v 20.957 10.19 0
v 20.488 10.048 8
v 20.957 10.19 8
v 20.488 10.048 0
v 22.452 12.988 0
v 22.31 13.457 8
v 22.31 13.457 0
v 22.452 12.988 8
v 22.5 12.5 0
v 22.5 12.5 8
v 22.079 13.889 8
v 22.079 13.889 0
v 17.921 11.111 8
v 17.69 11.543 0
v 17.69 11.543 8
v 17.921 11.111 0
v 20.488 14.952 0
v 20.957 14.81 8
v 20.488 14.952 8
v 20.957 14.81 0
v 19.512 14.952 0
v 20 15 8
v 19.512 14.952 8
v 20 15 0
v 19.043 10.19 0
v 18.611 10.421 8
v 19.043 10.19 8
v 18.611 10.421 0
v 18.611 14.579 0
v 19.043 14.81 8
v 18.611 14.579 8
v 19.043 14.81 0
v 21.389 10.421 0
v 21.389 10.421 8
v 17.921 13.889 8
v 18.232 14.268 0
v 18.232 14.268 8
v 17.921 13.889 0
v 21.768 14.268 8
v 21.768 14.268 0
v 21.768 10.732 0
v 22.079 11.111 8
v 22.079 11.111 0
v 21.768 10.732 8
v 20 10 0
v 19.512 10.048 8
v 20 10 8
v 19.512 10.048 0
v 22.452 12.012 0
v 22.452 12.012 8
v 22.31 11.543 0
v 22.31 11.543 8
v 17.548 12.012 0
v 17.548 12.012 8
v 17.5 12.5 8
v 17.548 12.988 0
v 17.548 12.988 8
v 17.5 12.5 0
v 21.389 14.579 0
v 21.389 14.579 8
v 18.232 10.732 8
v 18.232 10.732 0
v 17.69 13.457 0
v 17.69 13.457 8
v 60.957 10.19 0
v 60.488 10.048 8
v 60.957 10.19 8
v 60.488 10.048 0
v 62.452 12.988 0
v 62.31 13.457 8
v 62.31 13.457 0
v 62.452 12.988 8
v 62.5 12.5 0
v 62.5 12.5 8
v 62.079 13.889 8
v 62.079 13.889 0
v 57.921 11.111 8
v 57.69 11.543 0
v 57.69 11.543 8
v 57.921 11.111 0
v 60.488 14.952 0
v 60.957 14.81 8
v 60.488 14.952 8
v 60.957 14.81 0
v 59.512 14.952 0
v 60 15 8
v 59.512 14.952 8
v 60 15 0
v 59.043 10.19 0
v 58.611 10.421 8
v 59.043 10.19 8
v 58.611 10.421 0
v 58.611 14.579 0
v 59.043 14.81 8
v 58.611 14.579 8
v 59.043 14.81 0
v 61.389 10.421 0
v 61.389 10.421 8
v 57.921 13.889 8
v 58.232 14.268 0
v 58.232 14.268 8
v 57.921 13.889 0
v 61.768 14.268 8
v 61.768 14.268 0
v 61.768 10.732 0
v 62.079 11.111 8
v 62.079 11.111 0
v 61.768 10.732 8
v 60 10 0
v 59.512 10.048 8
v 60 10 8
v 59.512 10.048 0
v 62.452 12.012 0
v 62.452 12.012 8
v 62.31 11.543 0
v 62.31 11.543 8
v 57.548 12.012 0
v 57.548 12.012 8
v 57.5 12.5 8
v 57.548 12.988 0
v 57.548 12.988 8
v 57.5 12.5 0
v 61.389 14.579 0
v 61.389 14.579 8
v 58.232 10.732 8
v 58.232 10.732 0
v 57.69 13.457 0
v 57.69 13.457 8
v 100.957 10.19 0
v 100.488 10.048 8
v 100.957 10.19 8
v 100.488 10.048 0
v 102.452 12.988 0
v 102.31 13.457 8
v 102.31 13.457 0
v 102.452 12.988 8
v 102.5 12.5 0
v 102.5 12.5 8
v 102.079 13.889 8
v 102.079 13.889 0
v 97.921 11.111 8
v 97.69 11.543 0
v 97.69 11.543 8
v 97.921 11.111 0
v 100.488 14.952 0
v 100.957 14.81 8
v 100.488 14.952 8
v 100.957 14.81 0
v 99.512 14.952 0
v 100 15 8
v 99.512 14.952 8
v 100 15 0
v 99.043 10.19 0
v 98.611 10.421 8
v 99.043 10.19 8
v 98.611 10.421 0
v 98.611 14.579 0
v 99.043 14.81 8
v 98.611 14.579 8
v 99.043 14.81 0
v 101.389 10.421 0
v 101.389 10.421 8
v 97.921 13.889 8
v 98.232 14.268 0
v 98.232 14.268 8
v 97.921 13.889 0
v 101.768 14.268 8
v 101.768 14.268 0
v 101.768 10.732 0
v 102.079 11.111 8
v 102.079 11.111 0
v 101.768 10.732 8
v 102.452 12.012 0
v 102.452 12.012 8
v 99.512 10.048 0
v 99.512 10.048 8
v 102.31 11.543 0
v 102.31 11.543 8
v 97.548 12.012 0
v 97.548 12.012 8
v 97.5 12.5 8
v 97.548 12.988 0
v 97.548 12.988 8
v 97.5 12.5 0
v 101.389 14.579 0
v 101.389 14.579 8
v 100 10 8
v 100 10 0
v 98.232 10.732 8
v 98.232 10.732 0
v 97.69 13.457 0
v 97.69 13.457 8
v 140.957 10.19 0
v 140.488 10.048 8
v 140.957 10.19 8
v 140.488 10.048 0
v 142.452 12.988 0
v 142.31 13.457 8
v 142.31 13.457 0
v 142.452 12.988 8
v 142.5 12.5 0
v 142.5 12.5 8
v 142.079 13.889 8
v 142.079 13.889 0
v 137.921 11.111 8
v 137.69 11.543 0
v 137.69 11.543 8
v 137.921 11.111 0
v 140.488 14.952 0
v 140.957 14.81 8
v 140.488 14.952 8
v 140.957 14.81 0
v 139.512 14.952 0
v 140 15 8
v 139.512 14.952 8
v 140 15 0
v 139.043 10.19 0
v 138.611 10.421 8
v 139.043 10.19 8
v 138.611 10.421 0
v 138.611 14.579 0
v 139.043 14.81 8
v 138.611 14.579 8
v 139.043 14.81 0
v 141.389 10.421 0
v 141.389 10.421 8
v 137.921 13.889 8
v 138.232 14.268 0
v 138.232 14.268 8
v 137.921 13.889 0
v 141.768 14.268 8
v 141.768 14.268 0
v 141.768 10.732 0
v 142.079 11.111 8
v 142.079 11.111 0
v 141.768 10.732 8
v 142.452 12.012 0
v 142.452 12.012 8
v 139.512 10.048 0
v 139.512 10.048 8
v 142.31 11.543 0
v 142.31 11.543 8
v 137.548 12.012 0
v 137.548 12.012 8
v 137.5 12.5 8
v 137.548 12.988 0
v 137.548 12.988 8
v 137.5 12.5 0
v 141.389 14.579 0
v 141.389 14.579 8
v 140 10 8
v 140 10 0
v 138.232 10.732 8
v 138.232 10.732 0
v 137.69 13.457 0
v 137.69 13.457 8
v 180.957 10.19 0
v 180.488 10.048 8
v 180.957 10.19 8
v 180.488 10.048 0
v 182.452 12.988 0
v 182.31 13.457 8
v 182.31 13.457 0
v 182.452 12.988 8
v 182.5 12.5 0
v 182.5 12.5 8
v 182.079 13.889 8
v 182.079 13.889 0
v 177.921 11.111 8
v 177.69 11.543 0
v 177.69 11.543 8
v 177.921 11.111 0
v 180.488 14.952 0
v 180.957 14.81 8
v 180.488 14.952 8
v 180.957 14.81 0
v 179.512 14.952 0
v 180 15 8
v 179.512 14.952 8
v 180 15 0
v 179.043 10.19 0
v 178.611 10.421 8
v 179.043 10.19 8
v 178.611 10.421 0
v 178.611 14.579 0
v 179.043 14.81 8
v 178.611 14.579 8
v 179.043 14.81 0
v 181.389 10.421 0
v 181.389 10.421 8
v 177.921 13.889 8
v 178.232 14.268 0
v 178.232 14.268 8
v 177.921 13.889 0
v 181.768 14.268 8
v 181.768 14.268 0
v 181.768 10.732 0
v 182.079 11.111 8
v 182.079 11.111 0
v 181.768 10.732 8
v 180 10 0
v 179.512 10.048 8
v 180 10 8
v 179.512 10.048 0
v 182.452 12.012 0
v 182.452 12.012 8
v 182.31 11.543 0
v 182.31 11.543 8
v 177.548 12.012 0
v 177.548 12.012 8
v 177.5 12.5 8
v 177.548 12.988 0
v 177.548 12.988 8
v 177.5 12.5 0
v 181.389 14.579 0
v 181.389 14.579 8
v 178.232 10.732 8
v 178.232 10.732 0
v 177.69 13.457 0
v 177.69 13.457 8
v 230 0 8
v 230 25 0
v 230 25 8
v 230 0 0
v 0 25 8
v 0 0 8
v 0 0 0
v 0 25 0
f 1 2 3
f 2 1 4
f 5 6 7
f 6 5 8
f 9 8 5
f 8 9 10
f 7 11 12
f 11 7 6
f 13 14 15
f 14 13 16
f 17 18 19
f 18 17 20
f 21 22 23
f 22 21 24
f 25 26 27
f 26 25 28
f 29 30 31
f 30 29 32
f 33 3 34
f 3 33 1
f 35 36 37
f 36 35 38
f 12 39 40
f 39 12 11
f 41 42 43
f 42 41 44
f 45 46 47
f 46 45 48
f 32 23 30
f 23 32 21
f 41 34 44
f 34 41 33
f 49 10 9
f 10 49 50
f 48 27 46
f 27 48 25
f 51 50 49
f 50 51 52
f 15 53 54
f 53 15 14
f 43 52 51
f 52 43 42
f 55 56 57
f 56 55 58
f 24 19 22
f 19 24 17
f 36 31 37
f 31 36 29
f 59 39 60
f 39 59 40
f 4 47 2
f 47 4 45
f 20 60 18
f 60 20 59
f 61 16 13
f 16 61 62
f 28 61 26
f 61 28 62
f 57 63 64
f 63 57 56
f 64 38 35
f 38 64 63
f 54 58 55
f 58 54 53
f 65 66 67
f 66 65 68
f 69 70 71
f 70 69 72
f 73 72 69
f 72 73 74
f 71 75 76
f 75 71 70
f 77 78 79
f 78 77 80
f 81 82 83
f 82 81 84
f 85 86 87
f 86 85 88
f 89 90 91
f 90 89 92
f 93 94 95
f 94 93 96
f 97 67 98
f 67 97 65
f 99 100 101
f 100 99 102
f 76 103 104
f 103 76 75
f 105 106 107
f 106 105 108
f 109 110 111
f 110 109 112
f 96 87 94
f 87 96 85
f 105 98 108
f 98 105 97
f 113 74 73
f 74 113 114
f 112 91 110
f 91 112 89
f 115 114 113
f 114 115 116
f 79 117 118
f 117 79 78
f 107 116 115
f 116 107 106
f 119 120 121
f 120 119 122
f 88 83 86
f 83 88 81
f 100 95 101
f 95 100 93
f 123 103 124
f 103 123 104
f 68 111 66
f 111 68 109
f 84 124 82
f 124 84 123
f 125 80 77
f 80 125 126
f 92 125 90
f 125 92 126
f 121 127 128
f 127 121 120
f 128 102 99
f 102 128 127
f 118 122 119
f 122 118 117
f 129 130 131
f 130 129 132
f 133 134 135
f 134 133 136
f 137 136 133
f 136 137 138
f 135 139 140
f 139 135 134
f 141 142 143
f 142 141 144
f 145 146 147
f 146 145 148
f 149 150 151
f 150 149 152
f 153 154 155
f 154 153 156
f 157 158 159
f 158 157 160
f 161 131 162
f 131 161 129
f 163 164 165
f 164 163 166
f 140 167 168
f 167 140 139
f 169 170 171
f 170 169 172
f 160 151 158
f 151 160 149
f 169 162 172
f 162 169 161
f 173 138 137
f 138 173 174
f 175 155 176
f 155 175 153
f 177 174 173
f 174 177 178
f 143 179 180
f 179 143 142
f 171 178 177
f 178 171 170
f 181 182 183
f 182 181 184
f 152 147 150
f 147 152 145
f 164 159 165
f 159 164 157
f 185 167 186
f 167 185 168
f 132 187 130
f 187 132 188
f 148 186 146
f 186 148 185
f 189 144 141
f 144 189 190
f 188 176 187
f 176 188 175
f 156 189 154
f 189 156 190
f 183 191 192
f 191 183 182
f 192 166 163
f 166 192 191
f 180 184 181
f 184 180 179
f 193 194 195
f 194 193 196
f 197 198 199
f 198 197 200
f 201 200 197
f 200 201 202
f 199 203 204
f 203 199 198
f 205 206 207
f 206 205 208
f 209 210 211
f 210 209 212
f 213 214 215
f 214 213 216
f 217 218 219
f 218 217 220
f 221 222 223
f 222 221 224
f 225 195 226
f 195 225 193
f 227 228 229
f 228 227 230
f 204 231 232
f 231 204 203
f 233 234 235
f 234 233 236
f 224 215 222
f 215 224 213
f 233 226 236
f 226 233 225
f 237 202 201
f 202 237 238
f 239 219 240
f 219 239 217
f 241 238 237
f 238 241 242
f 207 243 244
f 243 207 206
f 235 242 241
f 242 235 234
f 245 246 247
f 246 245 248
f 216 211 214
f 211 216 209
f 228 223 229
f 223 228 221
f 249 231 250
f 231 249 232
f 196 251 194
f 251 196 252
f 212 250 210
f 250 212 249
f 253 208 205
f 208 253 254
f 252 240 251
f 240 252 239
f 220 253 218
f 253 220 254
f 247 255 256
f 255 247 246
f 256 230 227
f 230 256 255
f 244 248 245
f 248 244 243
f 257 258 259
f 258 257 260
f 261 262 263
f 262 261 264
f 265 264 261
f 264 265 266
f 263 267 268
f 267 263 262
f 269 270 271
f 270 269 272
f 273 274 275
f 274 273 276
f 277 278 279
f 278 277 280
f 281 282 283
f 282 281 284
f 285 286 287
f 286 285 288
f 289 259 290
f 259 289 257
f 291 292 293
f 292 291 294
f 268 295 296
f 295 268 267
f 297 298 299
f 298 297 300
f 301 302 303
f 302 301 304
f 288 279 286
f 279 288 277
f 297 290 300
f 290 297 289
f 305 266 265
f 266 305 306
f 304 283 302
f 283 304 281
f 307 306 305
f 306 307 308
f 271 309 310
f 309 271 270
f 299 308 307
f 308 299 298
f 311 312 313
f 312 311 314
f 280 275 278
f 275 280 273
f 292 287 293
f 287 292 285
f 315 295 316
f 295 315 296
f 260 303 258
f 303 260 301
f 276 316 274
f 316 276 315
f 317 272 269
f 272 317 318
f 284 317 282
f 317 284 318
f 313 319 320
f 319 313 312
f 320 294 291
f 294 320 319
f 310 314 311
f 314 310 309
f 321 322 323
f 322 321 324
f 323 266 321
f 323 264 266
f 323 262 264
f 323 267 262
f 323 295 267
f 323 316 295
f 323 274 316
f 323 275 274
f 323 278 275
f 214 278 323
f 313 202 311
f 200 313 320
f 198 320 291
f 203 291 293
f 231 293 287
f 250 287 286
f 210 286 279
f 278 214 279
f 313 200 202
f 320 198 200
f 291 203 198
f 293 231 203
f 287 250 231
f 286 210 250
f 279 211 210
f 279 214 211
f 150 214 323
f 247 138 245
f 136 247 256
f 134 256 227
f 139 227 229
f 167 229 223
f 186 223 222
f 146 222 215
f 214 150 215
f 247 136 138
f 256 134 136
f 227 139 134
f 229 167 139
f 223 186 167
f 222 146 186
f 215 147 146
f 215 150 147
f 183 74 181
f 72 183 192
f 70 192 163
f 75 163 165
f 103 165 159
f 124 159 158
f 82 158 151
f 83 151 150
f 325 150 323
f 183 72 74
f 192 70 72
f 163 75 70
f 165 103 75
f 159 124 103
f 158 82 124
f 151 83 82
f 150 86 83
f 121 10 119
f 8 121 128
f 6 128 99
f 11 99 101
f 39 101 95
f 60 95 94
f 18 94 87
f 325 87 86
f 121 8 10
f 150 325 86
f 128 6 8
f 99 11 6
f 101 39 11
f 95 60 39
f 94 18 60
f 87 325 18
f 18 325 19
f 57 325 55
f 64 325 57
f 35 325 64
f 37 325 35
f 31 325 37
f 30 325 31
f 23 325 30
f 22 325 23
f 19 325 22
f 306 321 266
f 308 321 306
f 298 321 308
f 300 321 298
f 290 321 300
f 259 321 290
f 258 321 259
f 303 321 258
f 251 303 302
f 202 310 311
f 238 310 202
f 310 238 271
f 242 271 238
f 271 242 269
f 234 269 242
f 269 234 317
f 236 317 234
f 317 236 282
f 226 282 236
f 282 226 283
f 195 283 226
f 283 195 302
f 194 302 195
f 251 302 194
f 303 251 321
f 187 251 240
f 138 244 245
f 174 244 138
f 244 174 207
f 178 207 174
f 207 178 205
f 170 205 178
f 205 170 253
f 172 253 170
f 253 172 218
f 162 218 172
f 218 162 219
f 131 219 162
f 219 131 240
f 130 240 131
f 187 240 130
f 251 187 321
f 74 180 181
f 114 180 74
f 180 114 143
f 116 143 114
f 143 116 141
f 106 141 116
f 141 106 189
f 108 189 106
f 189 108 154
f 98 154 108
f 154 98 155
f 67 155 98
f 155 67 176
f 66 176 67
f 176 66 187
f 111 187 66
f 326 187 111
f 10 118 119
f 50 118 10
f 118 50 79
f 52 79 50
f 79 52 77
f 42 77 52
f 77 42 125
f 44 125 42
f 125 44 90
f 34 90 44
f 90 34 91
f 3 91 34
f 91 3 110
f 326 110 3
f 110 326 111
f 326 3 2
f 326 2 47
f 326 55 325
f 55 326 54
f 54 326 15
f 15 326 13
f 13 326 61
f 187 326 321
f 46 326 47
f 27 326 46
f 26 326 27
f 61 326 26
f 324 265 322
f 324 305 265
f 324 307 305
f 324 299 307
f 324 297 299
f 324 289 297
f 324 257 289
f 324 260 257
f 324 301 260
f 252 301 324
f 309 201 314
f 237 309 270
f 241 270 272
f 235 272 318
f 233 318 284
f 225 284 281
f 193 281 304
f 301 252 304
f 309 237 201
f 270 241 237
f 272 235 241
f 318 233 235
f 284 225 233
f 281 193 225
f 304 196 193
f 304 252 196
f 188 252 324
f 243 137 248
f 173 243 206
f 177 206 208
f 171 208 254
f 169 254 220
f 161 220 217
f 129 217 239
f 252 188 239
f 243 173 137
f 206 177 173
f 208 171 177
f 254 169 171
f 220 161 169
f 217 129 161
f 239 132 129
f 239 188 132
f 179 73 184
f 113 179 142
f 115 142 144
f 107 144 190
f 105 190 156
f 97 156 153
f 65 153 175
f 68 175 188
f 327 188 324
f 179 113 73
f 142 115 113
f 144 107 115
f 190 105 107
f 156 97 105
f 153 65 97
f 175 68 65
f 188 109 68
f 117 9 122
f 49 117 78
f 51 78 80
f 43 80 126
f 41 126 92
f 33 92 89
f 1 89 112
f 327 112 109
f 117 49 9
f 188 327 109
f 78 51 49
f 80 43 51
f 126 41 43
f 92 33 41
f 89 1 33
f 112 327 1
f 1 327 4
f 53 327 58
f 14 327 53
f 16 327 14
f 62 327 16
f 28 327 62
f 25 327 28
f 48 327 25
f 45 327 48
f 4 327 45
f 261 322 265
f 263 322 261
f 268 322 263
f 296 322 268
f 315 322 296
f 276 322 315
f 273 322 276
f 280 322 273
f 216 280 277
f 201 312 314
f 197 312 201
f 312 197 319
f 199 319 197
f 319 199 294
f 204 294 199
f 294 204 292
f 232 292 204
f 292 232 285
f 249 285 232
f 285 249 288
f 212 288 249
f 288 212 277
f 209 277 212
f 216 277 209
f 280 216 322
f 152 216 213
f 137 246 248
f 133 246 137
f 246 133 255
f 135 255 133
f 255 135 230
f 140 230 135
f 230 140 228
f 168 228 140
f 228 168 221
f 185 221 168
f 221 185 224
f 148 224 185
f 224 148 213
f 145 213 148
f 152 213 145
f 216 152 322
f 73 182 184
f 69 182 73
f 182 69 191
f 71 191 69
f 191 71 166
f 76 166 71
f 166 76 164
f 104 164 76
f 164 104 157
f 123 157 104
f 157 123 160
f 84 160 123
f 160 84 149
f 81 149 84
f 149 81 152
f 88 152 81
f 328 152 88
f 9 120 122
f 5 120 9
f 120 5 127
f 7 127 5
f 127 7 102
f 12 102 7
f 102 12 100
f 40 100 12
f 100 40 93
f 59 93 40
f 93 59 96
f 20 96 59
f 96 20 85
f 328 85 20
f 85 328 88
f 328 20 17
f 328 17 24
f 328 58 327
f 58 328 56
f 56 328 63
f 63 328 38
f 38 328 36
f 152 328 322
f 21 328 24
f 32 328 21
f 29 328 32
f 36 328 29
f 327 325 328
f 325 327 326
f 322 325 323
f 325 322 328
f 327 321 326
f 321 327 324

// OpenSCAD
$fn = 32;

// ----------------------------------------------------------------------
// Long rail: 200-250 mm mounting rail
// ----------------------------------------------------------------------

// --- parameters (mm) ---
rail_l = 230;             // rail length, X
rail_w = 25;              // rail width, Y
rail_t = 8;               // rail thickness, Z
hole_d = 5;               // mounting hole diameter
hole_start = 20;          // first hole offset from the end
hole_pitch = 40;          // hole pitch
holes = 5;                // number of holes

difference() {
  cube([rail_l, rail_w, rail_t]);
  for (i = [0 : holes - 1])
    translate([hole_start + i * hole_pitch, rail_w / 2, -1])
      cylinder(h = rail_t + 2, d = hole_d);
}
